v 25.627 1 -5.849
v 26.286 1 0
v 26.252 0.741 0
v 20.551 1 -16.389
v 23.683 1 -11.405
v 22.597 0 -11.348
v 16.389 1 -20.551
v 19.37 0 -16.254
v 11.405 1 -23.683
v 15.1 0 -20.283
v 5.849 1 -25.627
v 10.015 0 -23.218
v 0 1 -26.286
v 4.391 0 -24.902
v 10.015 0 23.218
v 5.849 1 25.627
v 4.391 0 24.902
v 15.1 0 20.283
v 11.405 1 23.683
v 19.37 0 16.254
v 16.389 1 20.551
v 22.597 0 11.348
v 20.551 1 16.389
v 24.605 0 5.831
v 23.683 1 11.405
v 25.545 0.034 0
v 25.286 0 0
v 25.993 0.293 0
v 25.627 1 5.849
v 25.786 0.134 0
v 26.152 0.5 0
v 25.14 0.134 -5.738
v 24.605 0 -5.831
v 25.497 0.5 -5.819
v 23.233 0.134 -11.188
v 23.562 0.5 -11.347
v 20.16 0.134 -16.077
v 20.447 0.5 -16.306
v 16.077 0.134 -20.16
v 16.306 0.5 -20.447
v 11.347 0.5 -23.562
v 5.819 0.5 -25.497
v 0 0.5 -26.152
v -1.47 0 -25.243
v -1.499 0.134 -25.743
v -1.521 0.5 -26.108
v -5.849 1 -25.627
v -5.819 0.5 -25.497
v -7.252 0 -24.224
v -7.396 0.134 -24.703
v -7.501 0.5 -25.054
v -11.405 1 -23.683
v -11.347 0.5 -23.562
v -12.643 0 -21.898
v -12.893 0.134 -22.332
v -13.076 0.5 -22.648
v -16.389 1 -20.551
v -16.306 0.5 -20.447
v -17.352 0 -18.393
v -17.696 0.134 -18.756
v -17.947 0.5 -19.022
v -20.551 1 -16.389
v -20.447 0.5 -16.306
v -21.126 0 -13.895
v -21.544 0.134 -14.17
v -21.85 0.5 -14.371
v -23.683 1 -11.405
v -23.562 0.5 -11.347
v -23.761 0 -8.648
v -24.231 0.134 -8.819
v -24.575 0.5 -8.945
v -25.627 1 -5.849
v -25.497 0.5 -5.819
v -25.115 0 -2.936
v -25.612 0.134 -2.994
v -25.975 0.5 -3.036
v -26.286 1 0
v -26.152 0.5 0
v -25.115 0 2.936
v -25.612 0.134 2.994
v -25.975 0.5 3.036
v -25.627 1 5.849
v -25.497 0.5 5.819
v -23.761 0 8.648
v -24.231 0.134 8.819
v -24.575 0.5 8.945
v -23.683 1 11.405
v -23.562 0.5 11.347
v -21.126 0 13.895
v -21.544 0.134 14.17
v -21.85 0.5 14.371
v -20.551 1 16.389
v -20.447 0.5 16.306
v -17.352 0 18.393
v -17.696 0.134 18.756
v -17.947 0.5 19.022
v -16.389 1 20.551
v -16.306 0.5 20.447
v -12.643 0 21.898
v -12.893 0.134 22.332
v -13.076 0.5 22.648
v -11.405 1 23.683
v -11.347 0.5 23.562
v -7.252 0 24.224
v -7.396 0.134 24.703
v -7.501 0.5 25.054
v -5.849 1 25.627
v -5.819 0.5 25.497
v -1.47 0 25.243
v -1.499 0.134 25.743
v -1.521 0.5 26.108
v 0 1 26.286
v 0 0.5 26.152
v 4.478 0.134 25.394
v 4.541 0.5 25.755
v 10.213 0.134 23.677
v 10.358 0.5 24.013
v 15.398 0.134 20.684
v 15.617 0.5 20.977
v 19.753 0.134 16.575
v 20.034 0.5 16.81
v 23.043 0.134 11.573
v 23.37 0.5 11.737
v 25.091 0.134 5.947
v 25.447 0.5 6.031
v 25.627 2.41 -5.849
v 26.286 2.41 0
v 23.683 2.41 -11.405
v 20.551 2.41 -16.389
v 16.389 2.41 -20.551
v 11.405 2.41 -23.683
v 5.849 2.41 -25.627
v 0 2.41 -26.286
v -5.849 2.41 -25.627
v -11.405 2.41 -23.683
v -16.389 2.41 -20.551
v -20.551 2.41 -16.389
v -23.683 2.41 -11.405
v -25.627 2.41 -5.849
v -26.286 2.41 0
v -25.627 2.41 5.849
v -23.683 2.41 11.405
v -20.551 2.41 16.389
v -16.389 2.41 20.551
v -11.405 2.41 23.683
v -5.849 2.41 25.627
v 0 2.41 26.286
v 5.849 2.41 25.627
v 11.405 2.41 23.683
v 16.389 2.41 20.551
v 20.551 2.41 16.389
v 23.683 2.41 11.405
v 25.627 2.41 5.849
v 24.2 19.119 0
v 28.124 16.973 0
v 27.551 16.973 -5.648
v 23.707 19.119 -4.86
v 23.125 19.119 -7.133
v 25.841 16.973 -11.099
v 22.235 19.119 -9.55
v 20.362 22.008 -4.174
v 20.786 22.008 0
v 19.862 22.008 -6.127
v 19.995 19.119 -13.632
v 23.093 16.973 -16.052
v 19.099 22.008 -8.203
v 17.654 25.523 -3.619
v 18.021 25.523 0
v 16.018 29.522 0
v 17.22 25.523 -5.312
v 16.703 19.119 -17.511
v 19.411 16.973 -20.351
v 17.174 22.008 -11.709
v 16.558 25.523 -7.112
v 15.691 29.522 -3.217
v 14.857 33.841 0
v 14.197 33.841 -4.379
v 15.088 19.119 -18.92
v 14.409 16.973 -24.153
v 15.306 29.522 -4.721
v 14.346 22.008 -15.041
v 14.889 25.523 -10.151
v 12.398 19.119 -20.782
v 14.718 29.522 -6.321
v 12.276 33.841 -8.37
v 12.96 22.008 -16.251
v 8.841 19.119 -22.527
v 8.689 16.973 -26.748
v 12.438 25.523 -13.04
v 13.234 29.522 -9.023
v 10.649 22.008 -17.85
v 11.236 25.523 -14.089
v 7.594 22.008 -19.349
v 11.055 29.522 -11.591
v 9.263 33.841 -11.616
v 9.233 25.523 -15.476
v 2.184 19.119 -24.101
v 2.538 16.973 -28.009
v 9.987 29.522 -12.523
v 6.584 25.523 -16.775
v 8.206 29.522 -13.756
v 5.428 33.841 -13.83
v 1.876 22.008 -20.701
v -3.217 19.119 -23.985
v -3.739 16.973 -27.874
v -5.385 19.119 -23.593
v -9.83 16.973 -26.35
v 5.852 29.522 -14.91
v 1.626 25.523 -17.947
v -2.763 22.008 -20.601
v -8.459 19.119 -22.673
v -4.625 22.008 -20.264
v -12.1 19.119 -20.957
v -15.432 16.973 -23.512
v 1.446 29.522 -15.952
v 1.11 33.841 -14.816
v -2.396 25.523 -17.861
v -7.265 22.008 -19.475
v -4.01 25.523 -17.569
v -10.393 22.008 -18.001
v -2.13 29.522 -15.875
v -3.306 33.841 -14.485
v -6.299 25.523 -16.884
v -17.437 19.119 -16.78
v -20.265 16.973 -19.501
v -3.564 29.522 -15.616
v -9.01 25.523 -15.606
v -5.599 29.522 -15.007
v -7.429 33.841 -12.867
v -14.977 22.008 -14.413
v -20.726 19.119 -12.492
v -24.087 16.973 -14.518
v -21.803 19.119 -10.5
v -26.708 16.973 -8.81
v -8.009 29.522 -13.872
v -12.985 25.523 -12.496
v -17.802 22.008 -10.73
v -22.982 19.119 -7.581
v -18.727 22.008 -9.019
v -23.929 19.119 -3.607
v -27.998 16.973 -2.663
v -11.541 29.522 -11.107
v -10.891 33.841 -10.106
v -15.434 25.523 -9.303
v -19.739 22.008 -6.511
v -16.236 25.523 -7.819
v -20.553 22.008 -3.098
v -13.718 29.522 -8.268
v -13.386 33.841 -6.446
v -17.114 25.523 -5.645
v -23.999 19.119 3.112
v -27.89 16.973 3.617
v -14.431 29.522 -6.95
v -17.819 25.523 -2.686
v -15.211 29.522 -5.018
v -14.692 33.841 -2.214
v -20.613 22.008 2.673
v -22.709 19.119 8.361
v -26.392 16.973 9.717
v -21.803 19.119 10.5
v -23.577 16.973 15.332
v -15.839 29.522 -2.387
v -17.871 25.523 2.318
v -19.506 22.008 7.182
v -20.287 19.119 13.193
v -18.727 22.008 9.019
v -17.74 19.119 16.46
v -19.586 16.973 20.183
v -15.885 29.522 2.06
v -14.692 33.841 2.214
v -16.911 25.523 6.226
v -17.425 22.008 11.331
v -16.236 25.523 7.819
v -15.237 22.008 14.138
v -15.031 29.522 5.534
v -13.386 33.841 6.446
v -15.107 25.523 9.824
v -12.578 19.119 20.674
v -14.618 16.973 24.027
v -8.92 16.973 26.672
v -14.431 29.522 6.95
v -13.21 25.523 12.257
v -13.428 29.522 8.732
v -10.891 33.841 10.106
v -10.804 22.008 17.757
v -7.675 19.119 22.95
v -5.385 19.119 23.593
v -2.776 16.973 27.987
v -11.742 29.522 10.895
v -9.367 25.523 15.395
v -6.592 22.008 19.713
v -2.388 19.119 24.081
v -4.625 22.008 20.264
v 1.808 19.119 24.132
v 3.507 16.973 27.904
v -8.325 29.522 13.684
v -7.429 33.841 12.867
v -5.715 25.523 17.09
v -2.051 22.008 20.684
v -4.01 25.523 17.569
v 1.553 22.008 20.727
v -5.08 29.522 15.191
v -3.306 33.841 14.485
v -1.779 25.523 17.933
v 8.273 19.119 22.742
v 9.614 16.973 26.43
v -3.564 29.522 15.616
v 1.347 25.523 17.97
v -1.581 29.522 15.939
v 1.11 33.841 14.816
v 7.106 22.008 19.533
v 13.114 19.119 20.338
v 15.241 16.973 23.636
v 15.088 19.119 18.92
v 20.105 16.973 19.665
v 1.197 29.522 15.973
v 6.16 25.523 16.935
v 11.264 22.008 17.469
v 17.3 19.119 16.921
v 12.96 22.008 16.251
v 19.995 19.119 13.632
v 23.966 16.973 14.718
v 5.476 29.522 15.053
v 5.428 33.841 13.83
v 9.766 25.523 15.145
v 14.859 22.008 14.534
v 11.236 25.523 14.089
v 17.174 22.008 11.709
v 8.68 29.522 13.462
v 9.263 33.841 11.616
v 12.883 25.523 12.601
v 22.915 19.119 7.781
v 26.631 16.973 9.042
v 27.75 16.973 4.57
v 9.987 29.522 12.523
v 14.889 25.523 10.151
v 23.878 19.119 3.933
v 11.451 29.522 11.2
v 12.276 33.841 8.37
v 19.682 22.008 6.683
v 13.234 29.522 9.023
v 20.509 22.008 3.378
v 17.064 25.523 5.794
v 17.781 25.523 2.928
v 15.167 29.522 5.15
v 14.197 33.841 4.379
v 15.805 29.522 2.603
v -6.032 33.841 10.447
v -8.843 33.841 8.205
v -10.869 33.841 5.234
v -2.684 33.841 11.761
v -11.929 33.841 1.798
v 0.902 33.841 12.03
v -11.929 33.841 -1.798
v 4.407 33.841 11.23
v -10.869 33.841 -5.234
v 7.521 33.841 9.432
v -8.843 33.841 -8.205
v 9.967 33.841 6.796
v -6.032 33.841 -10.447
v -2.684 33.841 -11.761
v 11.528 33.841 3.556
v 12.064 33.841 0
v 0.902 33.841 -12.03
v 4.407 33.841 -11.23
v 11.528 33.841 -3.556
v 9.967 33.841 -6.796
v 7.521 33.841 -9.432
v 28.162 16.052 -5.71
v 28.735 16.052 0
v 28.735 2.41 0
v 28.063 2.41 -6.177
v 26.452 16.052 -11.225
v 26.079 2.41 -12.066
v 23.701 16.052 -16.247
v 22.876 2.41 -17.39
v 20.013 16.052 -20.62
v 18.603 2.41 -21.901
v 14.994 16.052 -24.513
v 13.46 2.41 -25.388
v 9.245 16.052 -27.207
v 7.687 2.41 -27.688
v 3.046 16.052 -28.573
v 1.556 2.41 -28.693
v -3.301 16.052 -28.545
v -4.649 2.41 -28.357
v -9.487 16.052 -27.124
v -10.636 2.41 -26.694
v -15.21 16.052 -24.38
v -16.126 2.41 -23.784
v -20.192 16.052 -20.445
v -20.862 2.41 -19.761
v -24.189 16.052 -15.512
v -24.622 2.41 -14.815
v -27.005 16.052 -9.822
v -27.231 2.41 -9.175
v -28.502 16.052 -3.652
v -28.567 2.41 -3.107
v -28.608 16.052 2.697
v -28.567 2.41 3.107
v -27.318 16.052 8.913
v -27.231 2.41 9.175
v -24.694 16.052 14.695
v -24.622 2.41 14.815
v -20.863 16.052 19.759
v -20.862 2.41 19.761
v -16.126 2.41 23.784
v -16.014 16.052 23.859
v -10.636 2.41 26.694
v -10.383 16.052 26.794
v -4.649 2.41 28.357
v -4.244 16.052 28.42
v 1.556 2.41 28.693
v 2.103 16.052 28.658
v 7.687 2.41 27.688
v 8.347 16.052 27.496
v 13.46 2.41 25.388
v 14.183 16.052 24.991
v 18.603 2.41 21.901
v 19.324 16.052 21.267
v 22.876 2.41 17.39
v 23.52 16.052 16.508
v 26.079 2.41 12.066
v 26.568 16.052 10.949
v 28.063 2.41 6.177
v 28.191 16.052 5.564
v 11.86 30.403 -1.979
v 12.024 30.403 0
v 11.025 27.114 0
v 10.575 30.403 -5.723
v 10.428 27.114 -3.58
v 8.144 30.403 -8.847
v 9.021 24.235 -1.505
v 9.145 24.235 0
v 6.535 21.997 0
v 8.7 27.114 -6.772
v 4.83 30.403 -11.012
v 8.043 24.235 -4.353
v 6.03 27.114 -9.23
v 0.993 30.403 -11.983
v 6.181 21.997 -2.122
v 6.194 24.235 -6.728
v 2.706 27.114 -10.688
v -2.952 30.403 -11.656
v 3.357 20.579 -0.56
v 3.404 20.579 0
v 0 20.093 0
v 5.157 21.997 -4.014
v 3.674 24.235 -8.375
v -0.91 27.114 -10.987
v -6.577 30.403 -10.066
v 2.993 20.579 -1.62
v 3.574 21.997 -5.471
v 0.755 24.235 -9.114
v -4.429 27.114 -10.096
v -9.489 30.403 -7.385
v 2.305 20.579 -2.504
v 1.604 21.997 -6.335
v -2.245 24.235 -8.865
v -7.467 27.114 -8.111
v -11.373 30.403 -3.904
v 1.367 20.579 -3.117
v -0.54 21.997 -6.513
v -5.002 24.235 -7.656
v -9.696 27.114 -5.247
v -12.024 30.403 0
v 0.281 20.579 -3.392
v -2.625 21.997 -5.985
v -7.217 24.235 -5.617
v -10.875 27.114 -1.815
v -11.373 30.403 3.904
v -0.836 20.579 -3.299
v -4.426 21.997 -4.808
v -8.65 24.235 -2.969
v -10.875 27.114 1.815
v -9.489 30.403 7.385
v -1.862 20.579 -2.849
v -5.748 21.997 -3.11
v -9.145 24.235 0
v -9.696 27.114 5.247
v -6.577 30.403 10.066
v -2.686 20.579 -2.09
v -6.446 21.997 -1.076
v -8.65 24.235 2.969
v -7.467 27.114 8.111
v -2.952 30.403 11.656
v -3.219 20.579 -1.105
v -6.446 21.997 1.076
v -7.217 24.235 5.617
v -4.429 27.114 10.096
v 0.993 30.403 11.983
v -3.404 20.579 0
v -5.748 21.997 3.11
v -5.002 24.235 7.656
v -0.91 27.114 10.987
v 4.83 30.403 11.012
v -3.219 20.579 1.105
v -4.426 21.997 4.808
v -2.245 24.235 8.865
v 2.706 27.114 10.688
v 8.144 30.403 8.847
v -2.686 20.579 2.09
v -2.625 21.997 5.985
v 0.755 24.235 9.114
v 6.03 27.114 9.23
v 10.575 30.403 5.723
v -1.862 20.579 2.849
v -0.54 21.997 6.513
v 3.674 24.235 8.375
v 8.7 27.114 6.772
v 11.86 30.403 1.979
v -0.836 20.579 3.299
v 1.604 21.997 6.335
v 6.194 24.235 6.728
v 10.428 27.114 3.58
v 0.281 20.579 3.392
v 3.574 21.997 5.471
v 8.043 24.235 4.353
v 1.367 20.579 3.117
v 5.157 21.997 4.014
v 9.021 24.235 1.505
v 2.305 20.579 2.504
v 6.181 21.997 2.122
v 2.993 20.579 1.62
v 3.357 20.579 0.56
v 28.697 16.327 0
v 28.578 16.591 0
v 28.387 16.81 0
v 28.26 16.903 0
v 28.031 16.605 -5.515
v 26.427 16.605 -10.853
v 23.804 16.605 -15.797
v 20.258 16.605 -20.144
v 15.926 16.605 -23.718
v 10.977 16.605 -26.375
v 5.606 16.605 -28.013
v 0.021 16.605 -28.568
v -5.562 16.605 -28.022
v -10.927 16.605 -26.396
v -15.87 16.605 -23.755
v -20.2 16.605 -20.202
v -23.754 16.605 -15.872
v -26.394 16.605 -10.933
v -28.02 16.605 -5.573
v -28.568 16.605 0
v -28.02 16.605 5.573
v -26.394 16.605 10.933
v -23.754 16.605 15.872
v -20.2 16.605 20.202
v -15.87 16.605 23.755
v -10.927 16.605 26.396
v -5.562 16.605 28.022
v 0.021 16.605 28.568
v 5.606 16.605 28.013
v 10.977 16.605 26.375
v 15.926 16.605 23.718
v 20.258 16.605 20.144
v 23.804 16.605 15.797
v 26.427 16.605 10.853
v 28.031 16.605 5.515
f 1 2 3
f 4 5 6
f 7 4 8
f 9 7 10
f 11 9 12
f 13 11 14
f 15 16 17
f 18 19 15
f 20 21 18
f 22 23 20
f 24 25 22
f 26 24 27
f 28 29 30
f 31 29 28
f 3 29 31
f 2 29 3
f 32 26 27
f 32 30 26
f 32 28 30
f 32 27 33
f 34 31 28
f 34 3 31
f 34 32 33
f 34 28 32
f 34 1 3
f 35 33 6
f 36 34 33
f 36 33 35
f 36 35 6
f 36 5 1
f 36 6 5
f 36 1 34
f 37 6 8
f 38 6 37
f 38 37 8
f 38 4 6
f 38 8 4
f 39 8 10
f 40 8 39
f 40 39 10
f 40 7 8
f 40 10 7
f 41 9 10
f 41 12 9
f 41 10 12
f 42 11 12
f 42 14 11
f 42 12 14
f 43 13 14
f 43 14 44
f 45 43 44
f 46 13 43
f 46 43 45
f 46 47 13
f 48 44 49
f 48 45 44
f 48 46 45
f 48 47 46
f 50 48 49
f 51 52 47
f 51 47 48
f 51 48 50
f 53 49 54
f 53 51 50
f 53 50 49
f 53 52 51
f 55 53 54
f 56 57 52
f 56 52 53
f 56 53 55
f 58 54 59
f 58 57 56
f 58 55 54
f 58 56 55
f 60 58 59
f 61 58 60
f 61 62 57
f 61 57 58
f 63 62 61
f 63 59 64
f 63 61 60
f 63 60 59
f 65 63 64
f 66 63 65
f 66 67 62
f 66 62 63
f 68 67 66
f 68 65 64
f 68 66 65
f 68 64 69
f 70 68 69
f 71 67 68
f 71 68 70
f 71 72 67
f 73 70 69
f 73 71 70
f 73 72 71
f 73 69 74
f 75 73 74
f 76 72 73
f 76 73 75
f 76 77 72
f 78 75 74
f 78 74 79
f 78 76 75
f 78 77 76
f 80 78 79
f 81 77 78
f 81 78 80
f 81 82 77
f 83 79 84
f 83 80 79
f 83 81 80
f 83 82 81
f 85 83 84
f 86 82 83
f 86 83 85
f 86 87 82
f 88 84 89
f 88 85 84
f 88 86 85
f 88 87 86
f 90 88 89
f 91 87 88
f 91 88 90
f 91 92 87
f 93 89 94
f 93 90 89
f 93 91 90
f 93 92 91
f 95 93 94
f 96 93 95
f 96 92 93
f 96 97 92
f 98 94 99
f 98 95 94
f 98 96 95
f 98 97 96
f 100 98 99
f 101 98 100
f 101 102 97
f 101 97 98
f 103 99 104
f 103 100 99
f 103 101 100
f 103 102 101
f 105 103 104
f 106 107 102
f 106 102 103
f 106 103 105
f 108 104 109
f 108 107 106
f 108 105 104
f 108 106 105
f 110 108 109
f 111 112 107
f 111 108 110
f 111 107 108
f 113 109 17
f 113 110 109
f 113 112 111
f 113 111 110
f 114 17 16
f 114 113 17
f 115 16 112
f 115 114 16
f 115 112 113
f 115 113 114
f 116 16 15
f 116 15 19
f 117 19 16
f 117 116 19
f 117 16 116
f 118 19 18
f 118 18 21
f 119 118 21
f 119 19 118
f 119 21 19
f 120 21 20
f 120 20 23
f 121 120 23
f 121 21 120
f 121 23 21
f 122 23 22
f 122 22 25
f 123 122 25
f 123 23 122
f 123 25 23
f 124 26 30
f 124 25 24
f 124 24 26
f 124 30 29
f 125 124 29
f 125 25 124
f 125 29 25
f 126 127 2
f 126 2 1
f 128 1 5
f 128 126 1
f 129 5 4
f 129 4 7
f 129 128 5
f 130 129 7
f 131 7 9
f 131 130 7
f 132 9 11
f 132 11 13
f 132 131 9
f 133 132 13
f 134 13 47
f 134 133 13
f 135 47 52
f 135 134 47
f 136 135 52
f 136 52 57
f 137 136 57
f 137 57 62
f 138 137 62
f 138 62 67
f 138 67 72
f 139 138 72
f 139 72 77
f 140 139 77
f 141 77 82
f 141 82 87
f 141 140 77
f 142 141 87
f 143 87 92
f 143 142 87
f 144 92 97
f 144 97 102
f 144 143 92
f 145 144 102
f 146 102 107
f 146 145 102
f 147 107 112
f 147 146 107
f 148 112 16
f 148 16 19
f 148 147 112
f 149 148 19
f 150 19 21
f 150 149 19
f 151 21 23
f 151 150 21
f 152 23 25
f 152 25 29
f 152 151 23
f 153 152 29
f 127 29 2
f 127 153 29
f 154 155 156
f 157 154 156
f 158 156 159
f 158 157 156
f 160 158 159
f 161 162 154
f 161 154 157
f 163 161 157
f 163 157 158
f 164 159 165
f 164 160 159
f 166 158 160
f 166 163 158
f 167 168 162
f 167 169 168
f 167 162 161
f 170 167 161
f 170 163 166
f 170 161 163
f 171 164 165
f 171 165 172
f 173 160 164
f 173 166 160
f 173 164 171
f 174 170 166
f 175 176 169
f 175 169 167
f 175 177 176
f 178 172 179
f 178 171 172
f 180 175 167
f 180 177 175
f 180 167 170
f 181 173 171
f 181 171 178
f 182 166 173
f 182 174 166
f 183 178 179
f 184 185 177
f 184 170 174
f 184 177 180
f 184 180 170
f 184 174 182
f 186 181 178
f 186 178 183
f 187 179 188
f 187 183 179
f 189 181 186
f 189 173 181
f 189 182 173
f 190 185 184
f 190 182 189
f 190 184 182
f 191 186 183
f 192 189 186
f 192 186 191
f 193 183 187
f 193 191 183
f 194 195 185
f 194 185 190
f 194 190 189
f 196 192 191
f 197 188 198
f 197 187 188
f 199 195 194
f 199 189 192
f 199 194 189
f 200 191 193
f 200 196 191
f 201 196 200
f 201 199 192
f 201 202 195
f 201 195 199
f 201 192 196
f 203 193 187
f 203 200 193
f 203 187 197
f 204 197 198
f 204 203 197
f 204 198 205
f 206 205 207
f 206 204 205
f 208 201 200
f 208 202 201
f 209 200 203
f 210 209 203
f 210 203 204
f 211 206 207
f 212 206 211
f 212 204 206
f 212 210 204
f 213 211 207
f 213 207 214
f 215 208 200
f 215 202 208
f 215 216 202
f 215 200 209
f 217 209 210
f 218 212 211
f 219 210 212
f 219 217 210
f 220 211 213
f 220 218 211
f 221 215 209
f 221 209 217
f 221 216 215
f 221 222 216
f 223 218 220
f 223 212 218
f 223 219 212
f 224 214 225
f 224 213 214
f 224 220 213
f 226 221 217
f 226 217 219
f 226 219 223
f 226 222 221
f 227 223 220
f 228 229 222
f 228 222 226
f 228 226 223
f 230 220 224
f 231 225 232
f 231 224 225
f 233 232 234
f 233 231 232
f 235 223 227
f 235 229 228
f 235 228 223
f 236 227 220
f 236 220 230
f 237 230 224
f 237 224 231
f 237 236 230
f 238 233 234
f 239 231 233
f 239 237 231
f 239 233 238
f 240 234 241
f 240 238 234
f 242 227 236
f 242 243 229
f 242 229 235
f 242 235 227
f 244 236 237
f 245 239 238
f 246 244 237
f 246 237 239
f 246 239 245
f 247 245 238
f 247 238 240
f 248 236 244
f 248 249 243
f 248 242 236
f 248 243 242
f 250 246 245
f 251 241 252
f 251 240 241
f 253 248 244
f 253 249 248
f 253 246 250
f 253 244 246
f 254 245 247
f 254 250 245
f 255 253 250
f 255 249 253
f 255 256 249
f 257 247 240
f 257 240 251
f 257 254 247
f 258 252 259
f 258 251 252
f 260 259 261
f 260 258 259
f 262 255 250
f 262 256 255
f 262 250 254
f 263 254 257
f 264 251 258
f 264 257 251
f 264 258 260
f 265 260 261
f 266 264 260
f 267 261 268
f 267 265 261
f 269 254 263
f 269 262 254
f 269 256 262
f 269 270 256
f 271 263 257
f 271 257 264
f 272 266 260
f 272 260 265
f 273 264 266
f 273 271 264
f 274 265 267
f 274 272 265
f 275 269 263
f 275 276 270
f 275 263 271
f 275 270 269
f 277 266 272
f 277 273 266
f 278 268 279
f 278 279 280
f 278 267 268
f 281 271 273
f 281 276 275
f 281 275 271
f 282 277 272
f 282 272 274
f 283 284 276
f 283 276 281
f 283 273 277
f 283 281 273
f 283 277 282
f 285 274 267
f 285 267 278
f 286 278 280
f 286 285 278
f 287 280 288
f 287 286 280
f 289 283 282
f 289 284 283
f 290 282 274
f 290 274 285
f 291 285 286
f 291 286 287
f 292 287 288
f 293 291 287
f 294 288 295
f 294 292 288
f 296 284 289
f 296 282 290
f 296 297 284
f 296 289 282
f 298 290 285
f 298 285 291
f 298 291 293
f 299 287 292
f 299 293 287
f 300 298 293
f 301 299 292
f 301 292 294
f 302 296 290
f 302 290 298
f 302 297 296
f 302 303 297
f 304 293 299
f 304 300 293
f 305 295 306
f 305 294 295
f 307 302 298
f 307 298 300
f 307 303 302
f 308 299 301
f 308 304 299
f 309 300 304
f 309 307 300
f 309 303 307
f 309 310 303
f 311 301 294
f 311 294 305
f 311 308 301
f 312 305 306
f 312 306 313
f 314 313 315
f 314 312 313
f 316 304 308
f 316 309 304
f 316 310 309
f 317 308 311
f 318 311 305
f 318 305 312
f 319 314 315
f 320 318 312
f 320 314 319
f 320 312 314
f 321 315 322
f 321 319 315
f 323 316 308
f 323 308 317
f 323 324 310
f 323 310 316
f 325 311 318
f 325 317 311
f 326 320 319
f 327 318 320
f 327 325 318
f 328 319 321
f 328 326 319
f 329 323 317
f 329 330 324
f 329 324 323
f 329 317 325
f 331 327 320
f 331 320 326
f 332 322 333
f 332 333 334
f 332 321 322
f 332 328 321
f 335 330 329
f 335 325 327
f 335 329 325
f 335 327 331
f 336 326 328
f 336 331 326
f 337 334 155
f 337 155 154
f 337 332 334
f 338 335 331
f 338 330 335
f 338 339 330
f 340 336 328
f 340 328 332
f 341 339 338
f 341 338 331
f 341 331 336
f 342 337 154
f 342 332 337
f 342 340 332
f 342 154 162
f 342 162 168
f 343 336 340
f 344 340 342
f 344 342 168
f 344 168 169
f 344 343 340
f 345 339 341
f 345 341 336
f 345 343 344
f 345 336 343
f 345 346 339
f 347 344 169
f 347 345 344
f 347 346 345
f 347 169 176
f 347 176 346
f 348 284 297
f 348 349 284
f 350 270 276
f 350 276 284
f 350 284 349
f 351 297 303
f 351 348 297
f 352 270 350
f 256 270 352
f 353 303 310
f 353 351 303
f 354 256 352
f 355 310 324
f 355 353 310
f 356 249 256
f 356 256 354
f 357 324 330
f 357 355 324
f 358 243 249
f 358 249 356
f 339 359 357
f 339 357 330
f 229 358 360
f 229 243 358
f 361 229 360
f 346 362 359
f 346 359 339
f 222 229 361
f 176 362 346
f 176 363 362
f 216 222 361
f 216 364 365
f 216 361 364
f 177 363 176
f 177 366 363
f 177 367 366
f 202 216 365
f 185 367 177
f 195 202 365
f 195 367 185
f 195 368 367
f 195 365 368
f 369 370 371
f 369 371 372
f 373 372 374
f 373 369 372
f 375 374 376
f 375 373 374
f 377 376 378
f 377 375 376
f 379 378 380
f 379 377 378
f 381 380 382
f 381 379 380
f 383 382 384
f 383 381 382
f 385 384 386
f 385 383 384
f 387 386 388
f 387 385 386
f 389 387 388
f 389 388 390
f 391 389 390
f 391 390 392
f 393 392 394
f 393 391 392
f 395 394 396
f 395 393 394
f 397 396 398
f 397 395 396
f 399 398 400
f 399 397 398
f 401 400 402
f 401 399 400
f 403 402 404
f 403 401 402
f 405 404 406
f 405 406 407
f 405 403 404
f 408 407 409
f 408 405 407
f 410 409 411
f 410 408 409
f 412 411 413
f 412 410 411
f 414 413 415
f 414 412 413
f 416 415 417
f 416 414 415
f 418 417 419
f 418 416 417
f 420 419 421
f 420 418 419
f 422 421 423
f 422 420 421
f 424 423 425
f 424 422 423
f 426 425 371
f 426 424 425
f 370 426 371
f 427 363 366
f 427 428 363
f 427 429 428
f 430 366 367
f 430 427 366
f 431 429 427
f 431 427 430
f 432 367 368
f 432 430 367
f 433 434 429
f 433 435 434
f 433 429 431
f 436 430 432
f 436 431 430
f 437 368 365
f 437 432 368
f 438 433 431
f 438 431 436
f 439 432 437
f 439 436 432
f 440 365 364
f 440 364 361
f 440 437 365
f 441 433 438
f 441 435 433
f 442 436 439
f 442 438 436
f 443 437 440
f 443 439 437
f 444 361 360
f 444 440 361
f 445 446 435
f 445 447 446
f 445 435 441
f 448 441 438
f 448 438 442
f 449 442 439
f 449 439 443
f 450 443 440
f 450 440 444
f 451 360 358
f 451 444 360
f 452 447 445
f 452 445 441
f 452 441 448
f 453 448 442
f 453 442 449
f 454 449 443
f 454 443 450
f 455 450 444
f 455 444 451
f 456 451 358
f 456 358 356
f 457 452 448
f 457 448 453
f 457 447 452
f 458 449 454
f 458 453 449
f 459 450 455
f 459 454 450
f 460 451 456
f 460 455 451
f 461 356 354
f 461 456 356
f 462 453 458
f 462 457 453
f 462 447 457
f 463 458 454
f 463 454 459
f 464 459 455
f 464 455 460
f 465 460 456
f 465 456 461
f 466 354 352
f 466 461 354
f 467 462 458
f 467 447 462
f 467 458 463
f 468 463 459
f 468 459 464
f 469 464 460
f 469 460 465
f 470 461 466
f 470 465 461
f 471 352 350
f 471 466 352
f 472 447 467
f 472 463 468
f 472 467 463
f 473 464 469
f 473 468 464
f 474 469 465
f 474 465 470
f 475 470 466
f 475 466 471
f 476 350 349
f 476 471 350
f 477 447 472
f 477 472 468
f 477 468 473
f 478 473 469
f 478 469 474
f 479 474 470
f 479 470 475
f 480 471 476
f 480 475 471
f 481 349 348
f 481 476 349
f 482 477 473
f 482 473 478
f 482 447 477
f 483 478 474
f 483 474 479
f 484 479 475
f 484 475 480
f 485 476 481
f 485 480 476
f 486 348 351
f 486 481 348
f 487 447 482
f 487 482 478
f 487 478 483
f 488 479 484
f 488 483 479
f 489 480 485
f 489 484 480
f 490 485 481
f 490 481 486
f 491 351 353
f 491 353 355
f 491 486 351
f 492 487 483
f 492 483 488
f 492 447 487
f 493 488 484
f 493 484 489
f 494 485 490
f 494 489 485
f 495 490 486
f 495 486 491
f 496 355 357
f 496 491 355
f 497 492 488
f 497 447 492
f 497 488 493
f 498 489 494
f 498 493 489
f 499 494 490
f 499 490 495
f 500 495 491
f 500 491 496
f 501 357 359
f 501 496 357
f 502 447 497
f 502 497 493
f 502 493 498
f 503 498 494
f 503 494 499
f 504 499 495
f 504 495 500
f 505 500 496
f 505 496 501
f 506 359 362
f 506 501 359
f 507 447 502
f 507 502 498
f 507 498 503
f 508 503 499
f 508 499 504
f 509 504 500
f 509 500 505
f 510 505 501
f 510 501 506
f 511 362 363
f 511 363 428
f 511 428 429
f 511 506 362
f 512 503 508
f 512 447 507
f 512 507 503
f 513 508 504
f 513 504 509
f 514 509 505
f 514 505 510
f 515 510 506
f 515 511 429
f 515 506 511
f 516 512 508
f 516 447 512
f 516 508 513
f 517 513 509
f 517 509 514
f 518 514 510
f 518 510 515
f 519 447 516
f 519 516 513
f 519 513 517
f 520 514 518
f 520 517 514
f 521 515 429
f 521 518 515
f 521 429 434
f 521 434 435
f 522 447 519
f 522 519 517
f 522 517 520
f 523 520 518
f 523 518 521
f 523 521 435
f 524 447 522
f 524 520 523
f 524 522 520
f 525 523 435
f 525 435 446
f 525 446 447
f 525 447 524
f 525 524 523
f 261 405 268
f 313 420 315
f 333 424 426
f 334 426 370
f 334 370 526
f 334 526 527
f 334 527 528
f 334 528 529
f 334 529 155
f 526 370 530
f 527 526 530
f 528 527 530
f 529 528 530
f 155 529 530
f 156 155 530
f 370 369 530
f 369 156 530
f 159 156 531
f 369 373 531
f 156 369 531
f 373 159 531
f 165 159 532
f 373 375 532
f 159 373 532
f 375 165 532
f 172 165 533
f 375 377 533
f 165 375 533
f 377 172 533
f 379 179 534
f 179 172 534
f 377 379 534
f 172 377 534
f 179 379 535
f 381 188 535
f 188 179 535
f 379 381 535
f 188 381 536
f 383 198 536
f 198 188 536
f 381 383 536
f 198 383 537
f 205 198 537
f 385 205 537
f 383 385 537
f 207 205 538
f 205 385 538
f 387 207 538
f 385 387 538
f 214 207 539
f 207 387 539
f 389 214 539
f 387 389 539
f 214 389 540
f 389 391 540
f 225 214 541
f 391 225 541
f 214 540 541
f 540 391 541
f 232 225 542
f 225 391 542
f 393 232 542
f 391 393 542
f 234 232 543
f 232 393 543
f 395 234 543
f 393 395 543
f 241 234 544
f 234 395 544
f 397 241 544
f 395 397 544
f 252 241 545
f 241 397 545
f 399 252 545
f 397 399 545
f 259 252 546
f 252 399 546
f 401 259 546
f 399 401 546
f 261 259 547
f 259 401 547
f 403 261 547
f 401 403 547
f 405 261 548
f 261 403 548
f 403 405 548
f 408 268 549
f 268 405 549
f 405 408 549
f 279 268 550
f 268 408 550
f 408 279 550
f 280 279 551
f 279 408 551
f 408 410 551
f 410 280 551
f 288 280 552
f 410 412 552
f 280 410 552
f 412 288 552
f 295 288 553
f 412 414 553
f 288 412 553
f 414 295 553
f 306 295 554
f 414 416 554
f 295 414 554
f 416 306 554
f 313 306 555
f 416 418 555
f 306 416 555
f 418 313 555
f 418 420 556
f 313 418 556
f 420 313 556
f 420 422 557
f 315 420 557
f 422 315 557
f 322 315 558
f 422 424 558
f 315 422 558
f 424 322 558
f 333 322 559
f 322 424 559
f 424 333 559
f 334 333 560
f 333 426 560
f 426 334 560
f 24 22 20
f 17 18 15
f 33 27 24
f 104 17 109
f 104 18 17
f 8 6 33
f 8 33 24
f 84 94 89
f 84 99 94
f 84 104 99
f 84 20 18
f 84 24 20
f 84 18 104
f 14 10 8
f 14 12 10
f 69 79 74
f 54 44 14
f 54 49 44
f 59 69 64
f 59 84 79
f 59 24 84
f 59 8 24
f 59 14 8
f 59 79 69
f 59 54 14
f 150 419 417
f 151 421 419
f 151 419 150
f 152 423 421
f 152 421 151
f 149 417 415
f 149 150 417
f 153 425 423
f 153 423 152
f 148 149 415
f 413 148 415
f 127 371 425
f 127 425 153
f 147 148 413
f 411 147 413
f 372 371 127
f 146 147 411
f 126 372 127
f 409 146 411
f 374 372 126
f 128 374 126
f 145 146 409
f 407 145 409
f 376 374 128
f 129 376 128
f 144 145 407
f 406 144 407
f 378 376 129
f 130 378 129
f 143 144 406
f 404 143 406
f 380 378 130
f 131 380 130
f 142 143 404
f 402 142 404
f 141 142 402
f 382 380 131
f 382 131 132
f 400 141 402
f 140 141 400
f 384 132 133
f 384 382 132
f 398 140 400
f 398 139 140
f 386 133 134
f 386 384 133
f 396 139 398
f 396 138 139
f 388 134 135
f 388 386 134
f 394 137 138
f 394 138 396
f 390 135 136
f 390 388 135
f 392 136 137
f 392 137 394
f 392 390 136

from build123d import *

# Parameters (mm, degrees)
FILLET1_R = 1


with BuildPart() as part:
    # Sketch1 → Revolve1 (revolve)
    with BuildSketch(Plane.XY):
        with BuildLine():
            Line((0, 0), (26.286199912, 0))
            Line((26.286199912, 0), (26.286199912, 2.410114973))
            Line((26.286199912, 2.410114973), (28.735209439, 2.410114973))
            Line((28.735209439, 2.410114973), (28.735209439, 16.726222584))
            ThreePointArc((28.735209439, 16.726222584), (19.520083074, 23.437939861), (14.857488789, 33.841108478))
            Line((14.857488789, 33.841108478), (12.063535171, 33.841108478))
            ThreePointArc((12.063535171, 33.841108478), (9.145229836, 24.235071542), (0, 20.092943721))
            Line((0, 20.092943721), (0, 0))
        make_face()
    revolve(axis=Axis((0, 0, 0), (0, 1, 0)))

    # Fillet1
    fillet1_edges = [part.edges().sort_by_distance(p)[0] for p in [
        (-28.735209439, 16.726222584, 0),
        (-26.286199912, 0, 0),
    ]]
    fillet(fillet1_edges, radius=FILLET1_R)


solid = part.part
